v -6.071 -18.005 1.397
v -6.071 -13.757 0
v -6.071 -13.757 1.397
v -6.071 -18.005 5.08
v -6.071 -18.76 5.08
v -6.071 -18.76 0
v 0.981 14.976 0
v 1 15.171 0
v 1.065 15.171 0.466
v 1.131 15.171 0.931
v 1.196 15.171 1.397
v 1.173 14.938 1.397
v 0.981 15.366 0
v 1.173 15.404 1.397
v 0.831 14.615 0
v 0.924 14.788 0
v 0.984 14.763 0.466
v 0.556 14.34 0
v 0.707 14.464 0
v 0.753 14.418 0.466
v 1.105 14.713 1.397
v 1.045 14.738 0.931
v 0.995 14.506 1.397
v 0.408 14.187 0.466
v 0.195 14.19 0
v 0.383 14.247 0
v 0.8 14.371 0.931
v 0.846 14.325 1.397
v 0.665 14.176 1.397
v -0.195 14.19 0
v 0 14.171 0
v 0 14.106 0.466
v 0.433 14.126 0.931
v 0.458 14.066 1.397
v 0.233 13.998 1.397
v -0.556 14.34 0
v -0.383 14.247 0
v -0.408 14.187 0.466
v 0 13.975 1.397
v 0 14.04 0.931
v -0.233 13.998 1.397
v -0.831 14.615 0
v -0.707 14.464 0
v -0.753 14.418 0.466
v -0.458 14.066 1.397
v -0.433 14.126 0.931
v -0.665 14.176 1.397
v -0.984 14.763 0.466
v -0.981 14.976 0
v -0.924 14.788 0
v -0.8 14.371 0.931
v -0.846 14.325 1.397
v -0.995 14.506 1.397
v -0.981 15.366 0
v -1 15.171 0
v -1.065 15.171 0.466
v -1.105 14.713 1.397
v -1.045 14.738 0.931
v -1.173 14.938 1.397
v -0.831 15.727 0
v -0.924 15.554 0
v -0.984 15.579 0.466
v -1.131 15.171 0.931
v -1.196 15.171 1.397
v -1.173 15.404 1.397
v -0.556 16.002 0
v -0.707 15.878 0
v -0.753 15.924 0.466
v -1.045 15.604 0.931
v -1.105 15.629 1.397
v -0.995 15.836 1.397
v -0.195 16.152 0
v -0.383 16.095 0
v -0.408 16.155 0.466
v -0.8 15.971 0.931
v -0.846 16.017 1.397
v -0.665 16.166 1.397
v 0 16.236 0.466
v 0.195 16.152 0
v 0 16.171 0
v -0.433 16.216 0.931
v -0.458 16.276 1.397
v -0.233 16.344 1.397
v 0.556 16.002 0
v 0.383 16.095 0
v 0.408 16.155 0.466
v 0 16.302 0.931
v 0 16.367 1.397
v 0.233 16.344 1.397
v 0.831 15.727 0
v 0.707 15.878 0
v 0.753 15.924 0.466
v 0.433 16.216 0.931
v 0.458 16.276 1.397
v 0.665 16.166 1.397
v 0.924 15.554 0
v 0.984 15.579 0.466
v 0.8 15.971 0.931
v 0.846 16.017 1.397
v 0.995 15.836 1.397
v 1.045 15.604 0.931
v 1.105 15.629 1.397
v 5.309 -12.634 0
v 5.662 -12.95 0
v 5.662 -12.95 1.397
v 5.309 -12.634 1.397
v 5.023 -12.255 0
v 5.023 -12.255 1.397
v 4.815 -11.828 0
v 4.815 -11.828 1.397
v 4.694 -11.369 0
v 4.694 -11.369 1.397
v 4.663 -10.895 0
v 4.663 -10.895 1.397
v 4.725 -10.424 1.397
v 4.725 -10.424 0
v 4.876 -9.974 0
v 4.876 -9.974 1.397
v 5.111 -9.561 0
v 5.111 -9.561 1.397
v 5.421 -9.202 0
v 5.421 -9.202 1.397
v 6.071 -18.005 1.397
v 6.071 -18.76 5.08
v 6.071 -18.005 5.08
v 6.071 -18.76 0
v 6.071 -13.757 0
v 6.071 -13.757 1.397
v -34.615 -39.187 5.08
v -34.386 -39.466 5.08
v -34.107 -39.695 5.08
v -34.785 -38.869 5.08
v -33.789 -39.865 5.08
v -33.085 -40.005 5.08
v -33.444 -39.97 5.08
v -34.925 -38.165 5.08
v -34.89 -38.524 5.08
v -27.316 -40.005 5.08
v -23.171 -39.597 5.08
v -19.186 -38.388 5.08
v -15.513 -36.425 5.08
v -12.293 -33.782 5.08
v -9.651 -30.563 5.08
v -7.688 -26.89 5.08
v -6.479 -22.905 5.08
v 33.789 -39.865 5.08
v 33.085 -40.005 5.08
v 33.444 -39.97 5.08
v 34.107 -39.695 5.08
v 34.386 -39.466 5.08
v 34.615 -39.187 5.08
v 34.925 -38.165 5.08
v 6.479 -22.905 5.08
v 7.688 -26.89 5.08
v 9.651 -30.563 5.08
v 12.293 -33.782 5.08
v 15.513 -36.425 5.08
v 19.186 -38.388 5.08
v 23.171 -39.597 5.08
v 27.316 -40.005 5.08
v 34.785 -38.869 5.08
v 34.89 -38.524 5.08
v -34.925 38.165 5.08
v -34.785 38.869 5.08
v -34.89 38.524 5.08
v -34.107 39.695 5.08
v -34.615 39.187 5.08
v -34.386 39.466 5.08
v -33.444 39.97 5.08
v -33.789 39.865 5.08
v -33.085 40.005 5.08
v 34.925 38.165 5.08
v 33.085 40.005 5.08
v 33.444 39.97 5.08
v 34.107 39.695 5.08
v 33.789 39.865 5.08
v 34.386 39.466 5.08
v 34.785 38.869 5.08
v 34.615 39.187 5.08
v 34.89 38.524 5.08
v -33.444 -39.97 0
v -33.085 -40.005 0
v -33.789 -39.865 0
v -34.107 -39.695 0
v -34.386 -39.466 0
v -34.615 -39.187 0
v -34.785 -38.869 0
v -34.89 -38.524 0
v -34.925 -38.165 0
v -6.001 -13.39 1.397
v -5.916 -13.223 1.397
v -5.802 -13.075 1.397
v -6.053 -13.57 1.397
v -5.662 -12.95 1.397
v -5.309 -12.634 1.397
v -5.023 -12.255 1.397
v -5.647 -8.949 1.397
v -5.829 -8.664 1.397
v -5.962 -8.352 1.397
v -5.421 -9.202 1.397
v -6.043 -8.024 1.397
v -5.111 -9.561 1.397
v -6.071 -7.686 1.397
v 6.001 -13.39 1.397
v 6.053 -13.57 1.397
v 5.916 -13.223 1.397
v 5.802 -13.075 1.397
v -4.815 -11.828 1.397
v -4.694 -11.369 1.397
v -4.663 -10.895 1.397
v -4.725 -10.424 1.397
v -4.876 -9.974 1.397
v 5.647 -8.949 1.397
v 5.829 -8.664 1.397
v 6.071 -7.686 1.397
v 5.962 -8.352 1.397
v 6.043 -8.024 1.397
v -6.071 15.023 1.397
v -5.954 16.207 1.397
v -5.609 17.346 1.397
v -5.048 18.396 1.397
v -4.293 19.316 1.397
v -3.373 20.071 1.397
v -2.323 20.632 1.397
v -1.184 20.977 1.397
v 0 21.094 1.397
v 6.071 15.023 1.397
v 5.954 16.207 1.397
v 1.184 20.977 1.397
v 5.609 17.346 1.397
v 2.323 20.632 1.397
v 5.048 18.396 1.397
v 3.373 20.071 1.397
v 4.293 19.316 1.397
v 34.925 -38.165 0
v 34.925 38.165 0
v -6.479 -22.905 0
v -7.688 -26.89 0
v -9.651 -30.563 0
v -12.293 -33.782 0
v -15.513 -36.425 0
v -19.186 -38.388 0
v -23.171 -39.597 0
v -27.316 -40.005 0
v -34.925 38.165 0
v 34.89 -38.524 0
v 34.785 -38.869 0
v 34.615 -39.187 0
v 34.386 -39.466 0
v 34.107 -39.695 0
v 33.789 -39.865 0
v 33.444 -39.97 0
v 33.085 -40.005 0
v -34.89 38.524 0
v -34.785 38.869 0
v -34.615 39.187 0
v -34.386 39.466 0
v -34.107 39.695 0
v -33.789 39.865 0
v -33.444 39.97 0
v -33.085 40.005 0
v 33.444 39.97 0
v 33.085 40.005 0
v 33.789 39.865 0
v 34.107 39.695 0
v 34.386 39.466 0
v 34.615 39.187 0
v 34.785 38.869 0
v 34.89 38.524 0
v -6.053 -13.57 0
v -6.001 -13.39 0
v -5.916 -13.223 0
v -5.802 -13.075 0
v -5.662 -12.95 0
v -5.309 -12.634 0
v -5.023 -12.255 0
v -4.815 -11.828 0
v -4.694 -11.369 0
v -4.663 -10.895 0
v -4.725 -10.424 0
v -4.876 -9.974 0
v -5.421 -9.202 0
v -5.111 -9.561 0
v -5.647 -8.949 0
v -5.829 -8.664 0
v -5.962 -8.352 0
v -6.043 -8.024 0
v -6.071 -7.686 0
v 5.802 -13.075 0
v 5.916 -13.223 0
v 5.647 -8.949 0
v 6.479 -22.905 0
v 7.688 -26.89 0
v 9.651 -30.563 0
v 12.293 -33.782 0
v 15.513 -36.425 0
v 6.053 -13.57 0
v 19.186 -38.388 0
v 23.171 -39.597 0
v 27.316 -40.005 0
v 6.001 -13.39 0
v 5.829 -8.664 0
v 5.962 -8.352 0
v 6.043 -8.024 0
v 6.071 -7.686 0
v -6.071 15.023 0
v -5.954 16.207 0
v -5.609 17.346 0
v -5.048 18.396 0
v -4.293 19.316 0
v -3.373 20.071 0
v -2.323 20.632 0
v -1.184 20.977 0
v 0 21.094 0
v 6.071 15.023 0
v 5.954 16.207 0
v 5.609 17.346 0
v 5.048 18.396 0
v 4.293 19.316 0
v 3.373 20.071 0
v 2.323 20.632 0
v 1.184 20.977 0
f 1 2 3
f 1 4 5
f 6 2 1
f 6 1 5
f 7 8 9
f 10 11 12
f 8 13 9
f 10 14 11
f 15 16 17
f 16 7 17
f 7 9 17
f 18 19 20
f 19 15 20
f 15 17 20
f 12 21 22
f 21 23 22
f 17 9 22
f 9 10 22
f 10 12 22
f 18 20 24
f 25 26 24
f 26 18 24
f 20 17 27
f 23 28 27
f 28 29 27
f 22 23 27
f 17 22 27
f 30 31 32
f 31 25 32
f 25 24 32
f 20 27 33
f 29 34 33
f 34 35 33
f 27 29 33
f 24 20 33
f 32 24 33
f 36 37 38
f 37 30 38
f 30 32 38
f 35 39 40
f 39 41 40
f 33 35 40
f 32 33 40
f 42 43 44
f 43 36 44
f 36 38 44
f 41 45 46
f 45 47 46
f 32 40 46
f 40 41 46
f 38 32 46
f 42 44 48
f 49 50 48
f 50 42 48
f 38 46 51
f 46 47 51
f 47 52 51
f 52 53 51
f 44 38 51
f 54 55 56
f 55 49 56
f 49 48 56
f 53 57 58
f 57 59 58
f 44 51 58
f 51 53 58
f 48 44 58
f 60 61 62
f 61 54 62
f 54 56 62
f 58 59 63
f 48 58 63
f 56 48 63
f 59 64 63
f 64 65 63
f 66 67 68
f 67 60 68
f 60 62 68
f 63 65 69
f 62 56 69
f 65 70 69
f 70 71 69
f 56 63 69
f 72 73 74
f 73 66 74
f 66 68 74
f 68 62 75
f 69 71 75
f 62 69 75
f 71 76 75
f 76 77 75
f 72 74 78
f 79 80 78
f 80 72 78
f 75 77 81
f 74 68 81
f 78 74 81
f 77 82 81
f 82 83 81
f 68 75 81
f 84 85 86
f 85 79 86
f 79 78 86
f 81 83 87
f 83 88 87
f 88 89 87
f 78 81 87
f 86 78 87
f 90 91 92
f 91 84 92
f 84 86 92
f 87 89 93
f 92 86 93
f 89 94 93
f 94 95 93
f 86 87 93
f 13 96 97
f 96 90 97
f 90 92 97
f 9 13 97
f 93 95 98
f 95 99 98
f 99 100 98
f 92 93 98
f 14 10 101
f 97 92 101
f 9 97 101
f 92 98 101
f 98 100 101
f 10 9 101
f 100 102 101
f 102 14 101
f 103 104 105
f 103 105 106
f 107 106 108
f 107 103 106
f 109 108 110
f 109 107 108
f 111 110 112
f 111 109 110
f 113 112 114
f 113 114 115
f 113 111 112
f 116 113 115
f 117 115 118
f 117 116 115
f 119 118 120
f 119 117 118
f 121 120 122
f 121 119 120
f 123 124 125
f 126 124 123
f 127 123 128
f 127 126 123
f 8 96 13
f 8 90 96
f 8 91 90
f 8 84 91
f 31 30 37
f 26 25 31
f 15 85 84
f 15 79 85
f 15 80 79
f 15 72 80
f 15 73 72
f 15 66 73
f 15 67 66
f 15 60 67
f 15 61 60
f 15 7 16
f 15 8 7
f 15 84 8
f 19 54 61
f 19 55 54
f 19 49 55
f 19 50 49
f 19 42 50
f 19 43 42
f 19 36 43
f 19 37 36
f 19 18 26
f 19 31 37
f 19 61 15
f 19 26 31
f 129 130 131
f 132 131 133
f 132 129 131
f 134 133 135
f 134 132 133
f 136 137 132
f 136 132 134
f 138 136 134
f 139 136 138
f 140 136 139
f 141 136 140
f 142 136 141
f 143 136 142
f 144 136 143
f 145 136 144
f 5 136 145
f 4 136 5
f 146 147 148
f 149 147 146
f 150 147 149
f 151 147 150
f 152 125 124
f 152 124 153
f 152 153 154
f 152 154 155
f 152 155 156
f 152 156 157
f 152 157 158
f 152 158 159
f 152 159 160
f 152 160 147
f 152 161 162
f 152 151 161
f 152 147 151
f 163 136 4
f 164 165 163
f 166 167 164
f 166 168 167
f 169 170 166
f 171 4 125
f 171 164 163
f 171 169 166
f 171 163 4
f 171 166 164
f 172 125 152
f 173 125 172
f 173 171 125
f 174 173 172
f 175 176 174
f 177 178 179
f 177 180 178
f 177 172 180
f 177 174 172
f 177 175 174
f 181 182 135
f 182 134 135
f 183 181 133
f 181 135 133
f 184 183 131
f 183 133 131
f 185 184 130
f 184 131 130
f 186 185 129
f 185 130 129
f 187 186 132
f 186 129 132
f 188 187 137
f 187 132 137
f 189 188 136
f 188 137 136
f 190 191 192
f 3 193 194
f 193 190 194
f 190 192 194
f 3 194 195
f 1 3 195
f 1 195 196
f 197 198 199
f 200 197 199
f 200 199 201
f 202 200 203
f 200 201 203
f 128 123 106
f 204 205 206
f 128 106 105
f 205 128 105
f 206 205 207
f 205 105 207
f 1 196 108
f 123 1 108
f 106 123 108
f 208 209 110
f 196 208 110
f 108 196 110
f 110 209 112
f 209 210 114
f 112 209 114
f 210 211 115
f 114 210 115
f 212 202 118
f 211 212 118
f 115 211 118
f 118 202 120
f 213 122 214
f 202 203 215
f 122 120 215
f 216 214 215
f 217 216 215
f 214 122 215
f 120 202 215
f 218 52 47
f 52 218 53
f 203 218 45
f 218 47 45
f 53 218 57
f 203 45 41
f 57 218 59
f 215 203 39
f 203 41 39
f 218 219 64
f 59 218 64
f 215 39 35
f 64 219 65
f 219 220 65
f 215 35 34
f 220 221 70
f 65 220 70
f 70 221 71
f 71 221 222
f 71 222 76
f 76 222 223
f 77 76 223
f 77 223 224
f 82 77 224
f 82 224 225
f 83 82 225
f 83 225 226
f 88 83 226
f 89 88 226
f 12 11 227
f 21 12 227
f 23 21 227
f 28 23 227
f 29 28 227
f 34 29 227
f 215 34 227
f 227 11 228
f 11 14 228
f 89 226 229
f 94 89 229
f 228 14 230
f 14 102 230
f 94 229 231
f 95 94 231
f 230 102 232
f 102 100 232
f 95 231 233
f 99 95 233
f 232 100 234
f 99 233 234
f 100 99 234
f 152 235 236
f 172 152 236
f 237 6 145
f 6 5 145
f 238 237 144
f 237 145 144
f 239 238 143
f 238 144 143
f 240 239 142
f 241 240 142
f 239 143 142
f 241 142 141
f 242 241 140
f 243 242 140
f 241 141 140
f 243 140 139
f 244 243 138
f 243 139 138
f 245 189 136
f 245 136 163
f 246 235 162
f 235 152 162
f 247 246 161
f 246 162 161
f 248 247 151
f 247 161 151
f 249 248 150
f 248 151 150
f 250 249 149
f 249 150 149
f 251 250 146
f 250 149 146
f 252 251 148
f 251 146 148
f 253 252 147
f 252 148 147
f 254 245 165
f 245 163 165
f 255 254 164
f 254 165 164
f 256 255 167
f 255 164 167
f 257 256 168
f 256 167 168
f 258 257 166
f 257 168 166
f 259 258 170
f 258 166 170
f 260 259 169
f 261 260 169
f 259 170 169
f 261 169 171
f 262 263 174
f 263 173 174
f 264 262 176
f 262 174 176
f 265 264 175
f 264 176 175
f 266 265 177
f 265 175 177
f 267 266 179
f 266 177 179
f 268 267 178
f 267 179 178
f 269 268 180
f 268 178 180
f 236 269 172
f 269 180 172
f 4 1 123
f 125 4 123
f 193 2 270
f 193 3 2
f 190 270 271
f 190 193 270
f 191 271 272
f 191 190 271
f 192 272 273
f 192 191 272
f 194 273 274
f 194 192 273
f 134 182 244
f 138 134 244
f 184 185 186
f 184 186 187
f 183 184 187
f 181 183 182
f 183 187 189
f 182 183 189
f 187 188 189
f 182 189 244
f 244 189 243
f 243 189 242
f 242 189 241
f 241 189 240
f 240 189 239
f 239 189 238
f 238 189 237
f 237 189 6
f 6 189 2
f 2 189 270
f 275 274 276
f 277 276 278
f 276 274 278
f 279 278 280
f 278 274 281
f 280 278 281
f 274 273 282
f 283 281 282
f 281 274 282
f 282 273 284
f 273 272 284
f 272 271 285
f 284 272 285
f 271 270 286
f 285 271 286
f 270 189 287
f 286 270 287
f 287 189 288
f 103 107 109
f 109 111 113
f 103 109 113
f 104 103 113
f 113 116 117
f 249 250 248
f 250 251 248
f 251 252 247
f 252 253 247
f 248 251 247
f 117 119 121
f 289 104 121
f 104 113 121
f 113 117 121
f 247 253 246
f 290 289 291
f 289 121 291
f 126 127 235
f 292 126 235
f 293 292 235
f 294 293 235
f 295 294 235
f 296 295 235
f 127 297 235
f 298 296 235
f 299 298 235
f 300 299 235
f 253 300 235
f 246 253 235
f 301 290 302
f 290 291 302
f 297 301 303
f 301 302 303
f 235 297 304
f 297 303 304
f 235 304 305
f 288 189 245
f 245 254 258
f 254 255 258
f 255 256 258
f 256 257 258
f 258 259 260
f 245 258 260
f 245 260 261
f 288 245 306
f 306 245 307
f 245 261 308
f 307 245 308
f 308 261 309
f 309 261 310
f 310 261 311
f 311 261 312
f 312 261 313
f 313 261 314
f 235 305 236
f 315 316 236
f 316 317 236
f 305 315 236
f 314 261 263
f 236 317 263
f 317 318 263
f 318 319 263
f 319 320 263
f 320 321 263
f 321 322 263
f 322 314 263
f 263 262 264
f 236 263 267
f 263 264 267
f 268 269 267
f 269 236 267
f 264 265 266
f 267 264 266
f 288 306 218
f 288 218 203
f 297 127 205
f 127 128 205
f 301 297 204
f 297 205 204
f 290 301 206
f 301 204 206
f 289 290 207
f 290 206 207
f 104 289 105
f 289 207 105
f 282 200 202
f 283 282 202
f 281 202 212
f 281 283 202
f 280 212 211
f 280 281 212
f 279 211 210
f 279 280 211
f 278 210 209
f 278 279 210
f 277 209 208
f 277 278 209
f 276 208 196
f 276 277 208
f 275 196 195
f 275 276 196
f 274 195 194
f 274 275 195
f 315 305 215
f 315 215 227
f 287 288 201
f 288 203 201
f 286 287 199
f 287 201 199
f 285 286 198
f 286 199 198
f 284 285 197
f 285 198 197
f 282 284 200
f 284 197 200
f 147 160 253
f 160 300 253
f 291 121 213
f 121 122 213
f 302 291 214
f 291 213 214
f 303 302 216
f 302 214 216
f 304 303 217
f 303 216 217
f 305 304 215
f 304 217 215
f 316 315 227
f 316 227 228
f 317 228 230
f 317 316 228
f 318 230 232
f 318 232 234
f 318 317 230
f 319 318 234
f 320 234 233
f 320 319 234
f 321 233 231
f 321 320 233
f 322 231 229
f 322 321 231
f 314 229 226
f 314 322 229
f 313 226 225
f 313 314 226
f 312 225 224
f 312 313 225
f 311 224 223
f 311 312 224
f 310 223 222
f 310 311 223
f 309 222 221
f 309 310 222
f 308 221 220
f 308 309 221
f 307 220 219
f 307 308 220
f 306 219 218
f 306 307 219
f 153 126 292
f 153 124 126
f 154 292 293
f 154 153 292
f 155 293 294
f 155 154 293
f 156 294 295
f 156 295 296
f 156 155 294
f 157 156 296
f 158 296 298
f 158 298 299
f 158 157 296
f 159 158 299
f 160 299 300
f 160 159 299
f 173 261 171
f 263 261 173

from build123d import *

# Parameters (mm, degrees)
F0_W     = 69.85
F0_H     = 80.01
F1_DEPTH = 5.08
F3_DEPTH = 1.397
F4_R     = 1
F5_R     = 1
F6_DEPTH = 1.397
F6_TAPER = -8
F7_W     = 12.1412
F7_H     = 22
F8_DEPTH = 3.684
F9_R     = 1.8396307345
F10_R    = 2.0944308897
F11_R    = 21.2450793489


with BuildPart() as f1:
    # F0 (on Top) → F1 (new body)
    with BuildSketch(Plane.XY):
        Rectangle(F0_W, F0_H)
    extrude(amount=F1_DEPTH)

    # F2 (on Top) → F3 (cut)
    with BuildSketch(Plane.XY):
        with BuildLine():
            ThreePointArc((6.0706, 15.0231522067), (0, 21.0937522067), (-6.0706, 15.0231522067))
            Line((-6.0706, 15.0231522067), (-6.0706, -3.937))
            Line((-6.0706, -3.937), (-6.0706, -8.7576295534))
            ThreePointArc((-6.0706, -8.7576295534), (-4.662, -10.9752828266), (-6.0706, -13.1929360997))
            Line((-6.0706, -13.1929360997), (-6.0706, -17.907))
            Line((-6.0706, -17.907), (-6.0706, -40.7645274005))
            Line((-6.0706, -40.7645274005), (6.0706, -40.7645274005))
            Line((6.0706, -40.7645274005), (6.0706, -13.1929360997))
            ThreePointArc((6.0706, -13.1929360997), (4.662, -10.9752828266), (6.0706, -8.7576295534))
            Line((6.0706, -8.7576295534), (6.0706, -3.937))
            Line((6.0706, -3.937), (6.0706, 15.0231522067))
        make_face()
    extrude(amount=F3_DEPTH, mode=Mode.SUBTRACT)

    # F4
    f4_edges = [f1.edges().sort_by_distance(p)[0] for p in [
        (-6.0706, -13.192936, 0.6985),
        (6.0706, -13.192936, 0.6985),
    ]]
    fillet(f4_edges, radius=F4_R)

    # F5 (on face) → F6 (join, through all)
    with BuildSketch(Plane(origin=(0, 0, 0), x_dir=(1, 0, 0), z_dir=(0, 0, -1))):
        with Locations((0, -15.171)):
            Circle(F5_R)
    extrude(amount=-F6_DEPTH, taper=F6_TAPER)

    # F7 (on face) → F8 (cut, through all)
    with BuildSketch(Plane(origin=(0, 0, 1.397), x_dir=(1, 0, 0), z_dir=(0, 0, -1))):
        with Locations((0, 29.005)):
            Rectangle(F7_W, F7_H)
    extrude(amount=-F8_DEPTH, mode=Mode.SUBTRACT)

    # F9
    f9_edges = [f1.edges().sort_by_distance(p)[0] for p in [
        (34.925, -40.005, 2.54),
        (-34.925, -40.005, 2.54),
        (-34.925, 40.005, 2.54),
        (34.925, 40.005, 2.54),
    ]]
    fillet(f9_edges, radius=F9_R)

    # F10
    f10_edges = [f1.edges().sort_by_distance(p)[0] for p in [
        (6.0706, -8.75763, 0.6985),
        (-6.0706, -8.75763, 0.6985),
    ]]
    fillet(f10_edges, radius=F10_R)

    # F11
    f11_edges = [f1.edges().sort_by_distance(p)[0] for p in [
        (6.0706, -40.005, 2.54),
        (-6.0706, -40.005, 2.54),
    ]]
    fillet(f11_edges, radius=F11_R)


solid = f1.part
